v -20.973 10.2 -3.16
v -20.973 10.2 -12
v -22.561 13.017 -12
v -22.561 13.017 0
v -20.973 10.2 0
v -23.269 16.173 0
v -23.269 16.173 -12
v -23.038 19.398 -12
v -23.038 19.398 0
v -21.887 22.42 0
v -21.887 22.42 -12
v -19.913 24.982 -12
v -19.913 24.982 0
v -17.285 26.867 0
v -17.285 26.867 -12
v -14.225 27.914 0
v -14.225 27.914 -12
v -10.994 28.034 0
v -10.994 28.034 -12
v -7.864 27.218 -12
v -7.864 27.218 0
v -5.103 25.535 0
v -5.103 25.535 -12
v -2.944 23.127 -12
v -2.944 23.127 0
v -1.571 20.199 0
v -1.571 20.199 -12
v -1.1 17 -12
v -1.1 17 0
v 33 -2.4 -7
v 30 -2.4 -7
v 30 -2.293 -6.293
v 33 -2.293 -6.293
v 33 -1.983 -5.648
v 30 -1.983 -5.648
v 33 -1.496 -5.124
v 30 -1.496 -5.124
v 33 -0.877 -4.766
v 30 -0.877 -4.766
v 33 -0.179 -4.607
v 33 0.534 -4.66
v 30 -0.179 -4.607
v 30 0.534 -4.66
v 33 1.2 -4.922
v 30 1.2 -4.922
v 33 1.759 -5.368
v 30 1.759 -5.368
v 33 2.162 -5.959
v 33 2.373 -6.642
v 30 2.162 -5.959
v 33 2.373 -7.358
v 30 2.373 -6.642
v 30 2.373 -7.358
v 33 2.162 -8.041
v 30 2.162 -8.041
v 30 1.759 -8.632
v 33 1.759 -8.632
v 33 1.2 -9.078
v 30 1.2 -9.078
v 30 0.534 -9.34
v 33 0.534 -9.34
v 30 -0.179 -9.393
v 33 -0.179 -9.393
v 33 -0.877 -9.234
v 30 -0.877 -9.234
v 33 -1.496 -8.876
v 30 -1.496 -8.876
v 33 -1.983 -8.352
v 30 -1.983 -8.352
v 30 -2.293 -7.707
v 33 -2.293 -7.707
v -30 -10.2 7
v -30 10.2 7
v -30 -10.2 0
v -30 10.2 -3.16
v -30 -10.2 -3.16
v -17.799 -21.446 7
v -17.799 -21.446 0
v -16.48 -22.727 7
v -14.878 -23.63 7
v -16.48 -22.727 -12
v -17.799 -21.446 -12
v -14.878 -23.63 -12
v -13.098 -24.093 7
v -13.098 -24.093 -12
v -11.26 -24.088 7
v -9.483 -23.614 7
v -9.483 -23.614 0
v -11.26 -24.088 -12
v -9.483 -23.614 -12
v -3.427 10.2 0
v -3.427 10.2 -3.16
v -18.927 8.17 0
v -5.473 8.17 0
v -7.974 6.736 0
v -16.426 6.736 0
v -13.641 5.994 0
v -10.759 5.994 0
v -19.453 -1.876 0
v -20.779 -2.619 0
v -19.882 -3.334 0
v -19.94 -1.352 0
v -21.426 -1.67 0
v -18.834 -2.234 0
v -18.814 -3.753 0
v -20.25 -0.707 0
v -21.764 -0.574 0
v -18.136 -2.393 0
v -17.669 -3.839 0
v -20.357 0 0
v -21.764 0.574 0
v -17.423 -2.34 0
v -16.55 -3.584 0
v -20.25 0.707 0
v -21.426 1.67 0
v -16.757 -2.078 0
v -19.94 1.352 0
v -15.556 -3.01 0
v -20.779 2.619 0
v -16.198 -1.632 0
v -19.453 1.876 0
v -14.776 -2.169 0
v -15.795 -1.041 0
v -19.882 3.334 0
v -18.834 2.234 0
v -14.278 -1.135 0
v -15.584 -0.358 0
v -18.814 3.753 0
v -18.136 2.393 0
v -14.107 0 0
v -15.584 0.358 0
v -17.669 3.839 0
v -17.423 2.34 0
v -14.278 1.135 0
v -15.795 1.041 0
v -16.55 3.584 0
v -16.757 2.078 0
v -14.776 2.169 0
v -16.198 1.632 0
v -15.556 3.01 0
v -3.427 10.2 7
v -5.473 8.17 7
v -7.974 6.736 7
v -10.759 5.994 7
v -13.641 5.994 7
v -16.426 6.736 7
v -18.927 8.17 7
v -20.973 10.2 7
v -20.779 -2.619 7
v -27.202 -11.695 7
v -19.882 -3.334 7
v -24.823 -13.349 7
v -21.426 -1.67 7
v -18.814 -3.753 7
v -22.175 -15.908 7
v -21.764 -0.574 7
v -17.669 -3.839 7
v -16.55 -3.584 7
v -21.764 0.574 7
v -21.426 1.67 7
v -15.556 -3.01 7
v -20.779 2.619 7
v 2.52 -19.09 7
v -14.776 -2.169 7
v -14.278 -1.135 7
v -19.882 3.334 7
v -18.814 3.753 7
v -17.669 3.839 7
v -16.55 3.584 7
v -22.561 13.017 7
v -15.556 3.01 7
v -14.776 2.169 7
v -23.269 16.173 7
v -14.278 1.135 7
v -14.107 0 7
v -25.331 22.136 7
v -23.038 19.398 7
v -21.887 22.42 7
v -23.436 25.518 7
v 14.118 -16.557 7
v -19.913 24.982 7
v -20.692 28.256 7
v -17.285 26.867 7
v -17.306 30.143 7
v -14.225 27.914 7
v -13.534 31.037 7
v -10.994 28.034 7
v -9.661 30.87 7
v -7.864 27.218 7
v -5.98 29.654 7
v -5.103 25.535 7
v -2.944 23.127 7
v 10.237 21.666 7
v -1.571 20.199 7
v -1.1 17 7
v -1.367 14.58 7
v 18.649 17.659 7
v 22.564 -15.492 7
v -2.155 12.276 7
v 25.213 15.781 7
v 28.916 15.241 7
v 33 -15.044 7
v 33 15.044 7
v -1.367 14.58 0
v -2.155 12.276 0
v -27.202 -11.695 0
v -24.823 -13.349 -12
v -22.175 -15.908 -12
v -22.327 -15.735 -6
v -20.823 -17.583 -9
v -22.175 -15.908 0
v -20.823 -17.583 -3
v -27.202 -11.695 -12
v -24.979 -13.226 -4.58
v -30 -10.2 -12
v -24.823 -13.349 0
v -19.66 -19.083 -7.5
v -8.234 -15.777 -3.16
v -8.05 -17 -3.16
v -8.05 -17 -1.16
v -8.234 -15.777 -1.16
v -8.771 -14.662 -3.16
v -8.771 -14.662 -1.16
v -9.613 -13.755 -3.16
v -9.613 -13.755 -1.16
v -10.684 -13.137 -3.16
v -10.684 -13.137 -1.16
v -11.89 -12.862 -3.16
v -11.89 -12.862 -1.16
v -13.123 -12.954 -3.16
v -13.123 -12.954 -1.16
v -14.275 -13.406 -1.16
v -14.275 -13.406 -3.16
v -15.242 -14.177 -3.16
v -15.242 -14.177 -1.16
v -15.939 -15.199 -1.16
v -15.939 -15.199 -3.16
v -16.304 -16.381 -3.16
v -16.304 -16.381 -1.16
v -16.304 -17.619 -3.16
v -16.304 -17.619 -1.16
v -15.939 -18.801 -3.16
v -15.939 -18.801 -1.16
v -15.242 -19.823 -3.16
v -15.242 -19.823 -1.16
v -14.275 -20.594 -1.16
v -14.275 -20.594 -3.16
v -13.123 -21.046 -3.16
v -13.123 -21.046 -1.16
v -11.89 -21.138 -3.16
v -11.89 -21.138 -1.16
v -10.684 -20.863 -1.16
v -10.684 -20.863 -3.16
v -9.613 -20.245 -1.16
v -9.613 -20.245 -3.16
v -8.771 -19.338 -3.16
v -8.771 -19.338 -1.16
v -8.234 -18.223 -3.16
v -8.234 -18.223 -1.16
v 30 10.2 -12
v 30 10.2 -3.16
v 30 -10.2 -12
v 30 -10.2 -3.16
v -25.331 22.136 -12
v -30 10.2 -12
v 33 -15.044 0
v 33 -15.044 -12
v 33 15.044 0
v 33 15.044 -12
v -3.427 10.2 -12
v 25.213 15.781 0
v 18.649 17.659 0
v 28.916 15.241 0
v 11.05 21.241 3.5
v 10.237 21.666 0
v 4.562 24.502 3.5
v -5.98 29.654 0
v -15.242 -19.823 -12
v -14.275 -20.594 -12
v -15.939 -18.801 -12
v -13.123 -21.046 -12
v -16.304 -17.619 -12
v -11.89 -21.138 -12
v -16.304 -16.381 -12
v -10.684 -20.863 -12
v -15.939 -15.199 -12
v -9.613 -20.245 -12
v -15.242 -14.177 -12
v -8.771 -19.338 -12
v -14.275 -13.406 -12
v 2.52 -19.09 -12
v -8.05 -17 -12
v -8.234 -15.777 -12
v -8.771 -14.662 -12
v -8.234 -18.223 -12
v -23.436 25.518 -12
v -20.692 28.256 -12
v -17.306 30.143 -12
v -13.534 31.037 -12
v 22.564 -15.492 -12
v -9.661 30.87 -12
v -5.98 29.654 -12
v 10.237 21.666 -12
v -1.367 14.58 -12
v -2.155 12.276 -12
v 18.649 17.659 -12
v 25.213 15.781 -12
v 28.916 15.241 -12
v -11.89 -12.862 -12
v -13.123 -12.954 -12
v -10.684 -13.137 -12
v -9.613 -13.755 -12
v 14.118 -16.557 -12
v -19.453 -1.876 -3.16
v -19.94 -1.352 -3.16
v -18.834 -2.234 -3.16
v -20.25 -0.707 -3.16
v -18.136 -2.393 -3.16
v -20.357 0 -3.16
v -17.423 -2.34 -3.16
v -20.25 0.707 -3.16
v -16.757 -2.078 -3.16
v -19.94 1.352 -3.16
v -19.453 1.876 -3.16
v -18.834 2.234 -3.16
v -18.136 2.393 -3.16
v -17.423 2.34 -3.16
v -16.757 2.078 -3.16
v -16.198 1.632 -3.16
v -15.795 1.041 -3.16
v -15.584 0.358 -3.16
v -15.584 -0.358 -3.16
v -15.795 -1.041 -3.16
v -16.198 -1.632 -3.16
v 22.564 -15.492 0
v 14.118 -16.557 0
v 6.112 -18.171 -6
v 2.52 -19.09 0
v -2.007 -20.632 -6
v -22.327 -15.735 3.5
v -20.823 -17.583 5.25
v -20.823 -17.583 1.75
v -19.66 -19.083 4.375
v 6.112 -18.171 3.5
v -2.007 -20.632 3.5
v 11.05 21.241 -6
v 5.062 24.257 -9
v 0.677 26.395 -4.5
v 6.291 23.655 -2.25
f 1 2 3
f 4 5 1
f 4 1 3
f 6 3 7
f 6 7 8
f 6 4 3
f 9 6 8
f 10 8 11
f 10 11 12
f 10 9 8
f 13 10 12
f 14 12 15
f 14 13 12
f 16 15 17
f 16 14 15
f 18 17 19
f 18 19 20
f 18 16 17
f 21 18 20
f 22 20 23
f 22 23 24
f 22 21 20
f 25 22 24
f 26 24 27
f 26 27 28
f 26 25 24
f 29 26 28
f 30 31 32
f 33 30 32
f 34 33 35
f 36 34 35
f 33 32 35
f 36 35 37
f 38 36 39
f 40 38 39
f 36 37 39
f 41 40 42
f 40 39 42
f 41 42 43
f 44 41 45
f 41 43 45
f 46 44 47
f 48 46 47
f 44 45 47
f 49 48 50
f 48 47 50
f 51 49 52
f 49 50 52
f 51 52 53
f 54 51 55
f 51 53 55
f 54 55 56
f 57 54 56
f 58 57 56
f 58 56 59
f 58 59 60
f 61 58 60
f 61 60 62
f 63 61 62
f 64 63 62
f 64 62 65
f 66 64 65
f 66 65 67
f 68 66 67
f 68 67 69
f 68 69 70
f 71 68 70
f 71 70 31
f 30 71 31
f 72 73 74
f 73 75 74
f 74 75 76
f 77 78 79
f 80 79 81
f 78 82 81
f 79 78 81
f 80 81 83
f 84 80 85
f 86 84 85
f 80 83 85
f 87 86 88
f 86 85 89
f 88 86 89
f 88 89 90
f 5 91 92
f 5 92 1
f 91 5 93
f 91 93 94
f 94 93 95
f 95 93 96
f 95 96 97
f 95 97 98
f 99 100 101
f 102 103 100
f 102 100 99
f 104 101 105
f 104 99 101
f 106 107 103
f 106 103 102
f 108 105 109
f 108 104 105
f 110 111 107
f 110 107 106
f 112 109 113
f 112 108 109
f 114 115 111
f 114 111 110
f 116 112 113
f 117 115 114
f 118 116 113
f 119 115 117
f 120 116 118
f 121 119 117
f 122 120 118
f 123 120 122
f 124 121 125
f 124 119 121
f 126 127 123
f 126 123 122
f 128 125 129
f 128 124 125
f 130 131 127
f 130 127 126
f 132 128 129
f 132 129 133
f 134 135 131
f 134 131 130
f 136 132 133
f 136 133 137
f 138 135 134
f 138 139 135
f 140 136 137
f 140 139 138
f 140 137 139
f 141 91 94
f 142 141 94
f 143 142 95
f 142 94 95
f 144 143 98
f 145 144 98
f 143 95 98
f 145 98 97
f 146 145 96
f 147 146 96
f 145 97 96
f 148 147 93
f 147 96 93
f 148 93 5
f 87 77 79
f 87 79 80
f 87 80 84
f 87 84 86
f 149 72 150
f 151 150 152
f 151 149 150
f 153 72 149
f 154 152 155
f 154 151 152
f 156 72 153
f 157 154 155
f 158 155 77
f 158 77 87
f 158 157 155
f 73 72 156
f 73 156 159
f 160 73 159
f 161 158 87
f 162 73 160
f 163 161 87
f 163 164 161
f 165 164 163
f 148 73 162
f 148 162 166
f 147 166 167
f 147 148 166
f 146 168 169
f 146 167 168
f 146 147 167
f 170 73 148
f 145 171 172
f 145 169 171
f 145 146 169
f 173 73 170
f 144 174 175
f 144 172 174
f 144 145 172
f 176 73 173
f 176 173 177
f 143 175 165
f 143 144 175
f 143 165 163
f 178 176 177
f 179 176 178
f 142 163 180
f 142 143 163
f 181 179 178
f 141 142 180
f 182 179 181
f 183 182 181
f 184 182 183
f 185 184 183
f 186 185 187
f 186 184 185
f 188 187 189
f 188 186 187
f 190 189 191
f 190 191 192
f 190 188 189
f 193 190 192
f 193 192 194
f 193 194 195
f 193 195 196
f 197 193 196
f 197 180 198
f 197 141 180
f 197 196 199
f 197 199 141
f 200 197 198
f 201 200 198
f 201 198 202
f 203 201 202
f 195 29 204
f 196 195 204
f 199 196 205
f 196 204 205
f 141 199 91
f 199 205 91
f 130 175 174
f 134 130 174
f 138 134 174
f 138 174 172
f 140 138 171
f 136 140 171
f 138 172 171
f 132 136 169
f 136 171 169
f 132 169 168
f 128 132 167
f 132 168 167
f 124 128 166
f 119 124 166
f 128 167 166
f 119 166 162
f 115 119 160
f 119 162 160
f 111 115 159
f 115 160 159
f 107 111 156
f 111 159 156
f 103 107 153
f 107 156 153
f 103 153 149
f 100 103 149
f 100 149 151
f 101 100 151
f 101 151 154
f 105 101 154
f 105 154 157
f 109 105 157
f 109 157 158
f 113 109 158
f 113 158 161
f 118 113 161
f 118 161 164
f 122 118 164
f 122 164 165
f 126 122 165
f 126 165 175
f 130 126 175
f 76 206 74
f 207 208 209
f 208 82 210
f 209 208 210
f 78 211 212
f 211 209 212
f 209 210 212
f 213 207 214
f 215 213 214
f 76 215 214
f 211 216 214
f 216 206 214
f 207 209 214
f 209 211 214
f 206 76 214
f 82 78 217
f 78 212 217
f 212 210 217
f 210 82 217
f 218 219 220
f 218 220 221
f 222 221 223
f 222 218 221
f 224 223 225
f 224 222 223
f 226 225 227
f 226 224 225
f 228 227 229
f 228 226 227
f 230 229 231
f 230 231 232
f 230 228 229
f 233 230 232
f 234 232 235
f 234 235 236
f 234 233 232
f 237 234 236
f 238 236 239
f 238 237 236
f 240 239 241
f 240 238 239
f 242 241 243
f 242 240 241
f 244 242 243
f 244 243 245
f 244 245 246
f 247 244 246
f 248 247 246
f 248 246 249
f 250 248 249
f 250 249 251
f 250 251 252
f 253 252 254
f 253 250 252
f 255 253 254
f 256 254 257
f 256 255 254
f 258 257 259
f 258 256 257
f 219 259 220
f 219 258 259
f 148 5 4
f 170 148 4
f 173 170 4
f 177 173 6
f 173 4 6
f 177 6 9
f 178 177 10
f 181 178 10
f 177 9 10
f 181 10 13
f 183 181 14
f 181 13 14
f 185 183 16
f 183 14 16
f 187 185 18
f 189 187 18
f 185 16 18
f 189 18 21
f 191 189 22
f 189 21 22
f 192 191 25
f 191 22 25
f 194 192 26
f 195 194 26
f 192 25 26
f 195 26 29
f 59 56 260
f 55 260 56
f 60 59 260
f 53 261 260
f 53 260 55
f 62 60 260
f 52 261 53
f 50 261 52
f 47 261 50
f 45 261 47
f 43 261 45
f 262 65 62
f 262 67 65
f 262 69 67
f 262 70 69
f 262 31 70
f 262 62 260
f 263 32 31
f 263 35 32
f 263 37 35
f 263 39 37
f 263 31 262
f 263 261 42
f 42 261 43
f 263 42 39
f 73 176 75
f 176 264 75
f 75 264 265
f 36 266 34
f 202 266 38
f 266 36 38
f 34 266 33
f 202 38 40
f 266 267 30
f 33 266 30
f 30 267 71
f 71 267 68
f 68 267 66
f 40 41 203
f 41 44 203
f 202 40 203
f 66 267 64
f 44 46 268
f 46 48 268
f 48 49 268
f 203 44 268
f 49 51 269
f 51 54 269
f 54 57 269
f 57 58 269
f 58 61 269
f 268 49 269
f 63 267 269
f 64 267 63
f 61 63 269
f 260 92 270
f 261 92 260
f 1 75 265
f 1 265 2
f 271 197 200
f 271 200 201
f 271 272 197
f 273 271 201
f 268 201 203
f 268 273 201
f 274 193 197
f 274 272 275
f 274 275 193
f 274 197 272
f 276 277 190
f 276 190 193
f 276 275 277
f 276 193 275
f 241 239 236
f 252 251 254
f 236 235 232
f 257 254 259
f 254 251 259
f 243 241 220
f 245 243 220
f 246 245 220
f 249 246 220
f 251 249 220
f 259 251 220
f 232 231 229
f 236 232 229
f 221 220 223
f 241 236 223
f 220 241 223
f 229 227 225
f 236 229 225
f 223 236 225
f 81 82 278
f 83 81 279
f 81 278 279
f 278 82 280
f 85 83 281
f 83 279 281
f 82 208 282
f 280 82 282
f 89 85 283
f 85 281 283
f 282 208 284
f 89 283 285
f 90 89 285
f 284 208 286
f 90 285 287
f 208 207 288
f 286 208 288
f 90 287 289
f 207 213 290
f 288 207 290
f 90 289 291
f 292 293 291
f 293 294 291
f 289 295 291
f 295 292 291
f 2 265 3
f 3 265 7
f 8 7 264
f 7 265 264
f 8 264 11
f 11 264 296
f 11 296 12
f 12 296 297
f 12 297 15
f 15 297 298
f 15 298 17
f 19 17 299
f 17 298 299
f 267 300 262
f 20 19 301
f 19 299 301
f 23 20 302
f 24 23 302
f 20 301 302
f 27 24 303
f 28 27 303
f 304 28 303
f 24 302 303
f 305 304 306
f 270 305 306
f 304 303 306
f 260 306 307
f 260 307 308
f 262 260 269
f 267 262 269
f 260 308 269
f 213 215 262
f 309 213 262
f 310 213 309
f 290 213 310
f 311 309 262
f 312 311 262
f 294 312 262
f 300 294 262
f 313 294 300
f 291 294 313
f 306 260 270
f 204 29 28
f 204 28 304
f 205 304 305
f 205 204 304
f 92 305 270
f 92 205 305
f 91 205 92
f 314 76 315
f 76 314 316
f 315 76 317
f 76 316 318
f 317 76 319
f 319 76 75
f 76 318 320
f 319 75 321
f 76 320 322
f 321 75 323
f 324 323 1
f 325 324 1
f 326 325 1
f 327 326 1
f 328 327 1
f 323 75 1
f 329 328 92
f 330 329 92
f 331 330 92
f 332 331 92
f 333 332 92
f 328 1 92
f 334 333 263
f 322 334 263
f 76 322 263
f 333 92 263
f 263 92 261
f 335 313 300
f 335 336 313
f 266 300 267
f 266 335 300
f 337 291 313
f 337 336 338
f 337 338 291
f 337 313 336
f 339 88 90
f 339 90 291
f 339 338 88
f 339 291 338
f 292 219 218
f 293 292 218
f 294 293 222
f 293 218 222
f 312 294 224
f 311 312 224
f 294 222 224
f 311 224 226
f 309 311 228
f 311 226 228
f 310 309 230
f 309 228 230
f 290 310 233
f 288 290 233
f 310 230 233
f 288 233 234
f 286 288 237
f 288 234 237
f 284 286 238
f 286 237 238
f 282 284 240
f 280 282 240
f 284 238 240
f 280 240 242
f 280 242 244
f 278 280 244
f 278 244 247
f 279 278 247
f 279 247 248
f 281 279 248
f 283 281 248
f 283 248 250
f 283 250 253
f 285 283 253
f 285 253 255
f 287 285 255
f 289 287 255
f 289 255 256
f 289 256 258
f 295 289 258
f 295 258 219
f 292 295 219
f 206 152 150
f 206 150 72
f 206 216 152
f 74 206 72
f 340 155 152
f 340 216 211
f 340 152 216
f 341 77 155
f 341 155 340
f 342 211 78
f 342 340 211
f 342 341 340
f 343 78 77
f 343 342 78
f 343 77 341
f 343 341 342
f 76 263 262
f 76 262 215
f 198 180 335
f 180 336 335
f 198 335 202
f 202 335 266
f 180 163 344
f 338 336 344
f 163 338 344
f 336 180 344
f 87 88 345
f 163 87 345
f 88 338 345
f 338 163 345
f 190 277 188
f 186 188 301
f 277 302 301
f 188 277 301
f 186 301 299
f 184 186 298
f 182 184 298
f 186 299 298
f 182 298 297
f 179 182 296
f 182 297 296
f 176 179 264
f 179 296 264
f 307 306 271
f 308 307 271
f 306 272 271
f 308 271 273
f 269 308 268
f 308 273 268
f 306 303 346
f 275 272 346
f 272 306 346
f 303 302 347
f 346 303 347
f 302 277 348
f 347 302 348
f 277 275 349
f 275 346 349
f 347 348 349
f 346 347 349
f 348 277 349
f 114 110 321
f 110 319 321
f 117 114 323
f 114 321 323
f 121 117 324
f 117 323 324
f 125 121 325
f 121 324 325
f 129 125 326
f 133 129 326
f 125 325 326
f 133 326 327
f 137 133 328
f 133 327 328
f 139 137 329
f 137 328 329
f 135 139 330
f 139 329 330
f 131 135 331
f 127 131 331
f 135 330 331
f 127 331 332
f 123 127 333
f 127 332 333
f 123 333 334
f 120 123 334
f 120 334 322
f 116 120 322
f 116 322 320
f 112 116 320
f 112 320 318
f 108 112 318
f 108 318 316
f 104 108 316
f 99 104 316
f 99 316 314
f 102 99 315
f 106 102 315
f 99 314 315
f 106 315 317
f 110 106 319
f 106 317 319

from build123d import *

# Parameters (mm, degrees)
F0_R           = 4.15
F1_DEPTH       = 12
F2_DEPTH       = 3.16
F3_DEPTH       = 7
F6_D           = 4.8
F6_DEPTH       = 15
F6_CBORE_D     = 7.7
F6_CBORE_DEPTH = 7
F6_TIP         = 1.4420654857
F7_D           = 4.8
F7_DEPTH       = 10
F7_TIP         = 1.4420654857
F8_DEPTH       = 2


# Not quite as in the source:
# - after a boolean that leaves OpenCascade's solid faulty, fix() repairs it


with BuildPart() as f1:
    # F0 (on Top) → F1 (new body)
    with BuildSketch(Plane.XY):
        with BuildLine():
            Line((30, 10.2), (30, -10.2))
            Line((30, -10.2), (-30, -10.2))
            add(Edge.make_bspline(
                [(-17.7992275989, -21.4464761661), (-20.8859294653, -17.5595451146), (-21.6980138001, -16.2221621605), (-25.6317793117, -12.2553748449), (-30, -10.2)],
                knots=[0, 0, 0, 0, 0.4674468376, 1, 1, 1, 1], degree=3))
            ThreePointArc((-17.7992275989, -21.4464761661), (-14.003054565, -23.9189229101), (-9.4830172376, -23.6136604591))
            add(Edge.make_bspline(
                [(-9.4830172376, -23.6136604591), (0, -19.7179064316), (4.4370511503, -18.4021307002), (20.4163611322, -15.0439910263), (33, -15.0439910263)],
                knots=[0, 0, 0, 0, 0.4385632438, 1, 1, 1, 1], degree=3))
            Line((33, -15.0439910263), (33, 15.0439910263))
            add(Edge.make_bspline(
                [(-5.9802875731, 29.6540577416), (4.8586864574, 24.3264938357), (9.2455528778, 22.3735984932), (22.4546817712, 15.0439910263), (33, 15.0439910263)],
                knots=[0.0105896754, 0.0105896754, 0.0105896754, 0.0105896754, 0.4824749826, 1, 1, 1, 1], degree=3))
            ThreePointArc((-5.9802875731, 29.6540577416), (-0.2311248394, 24.4535915766), (1.9, 17))
            ThreePointArc((1.9, 17), (1.4559897714, 13.4894525551), (0.1519229272, 10.2))
            Line((0.1519229272, 10.2), (30, 10.2))
        make_face()
        with Locations((-12.2, -17)):
            Circle(F0_R, mode=Mode.SUBTRACT)
        with BuildLine():
            Line((-3.4267451878, 10.2), (0.1519229272, 10.2))
            ThreePointArc((0.1519229272, 10.2), (1.4559897714, 13.4894525551), (1.9, 17))
            ThreePointArc((1.9, 17), (-0.2311248394, 24.4535915766), (-5.9802875731, 29.6540577416))
            ThreePointArc((-5.9802875731, 29.6540577416), (-17.3060634553, 30.1429873313), (-25.3312422306, 22.1361928977))
            ThreePointArc((-25.3312422306, 22.1361928977), (-26.2700427092, 16.0813607005), (-24.5519229272, 10.2))
            Line((-24.5519229272, 10.2), (-20.9732548122, 10.2))
            ThreePointArc((-20.9732548122, 10.2), (-15.7935269294, 27.5022171092), (-1.1, 17))
            ThreePointArc((-1.1, 17), (-1.6977828908, 13.4064730706), (-3.4267451878, 10.2))
        make_face()
        with BuildLine():
            Line((-25.3312422306, 22.1361928977), (-30, 10.2))
            Line((-30, 10.2), (-24.5519229272, 10.2))
            ThreePointArc((-24.5519229272, 10.2), (-26.2700427092, 16.0813607005), (-25.3312422306, 22.1361928977))
        make_face()
    extrude(amount=-F1_DEPTH)

    # F0 (on Top) → F2 (join)
    with BuildSketch(Plane.XY):
        with BuildLine():
            Line((-30, -10.2), (30, -10.2))
            Line((30, -10.2), (30, 10.2))
            Line((30, 10.2), (0.1519229272, 10.2))
            ThreePointArc((0.1519229272, 10.2), (-12.2, 2.9), (-24.5519229272, 10.2))
            Line((-24.5519229272, 10.2), (-30, 10.2))
            Line((-30, 10.2), (-30, -10.2))
        make_face()
        with BuildLine():
            ThreePointArc((-24.5519229272, 10.2), (-12.2, 2.9), (0.1519229272, 10.2))
            Line((0.1519229272, 10.2), (-3.4267451878, 10.2))
            ThreePointArc((-3.4267451878, 10.2), (-12.2, 5.9), (-20.9732548122, 10.2))
            Line((-20.9732548122, 10.2), (-24.5519229272, 10.2))
        make_face()
        with BuildLine():
            ThreePointArc((-20.9732548122, 10.2), (-12.2, 5.9), (-3.4267451878, 10.2))
            Line((-3.4267451878, 10.2), (-20.9732548122, 10.2))
        make_face()
        with Locations((-12.2, -17)):
            Circle(F0_R)
    extrude(amount=-F2_DEPTH)

    # F0 (on Top) → F3 (join)
    with BuildSketch(Plane.XY):
        with BuildLine():
            Line((-3.4267451878, 10.2), (0.1519229272, 10.2))
            ThreePointArc((0.1519229272, 10.2), (1.4559897714, 13.4894525551), (1.9, 17))
            ThreePointArc((1.9, 17), (-0.2311248394, 24.4535915766), (-5.9802875731, 29.6540577416))
            ThreePointArc((-5.9802875731, 29.6540577416), (-17.3060634553, 30.1429873313), (-25.3312422306, 22.1361928977))
            ThreePointArc((-25.3312422306, 22.1361928977), (-26.2700427092, 16.0813607005), (-24.5519229272, 10.2))
            Line((-24.5519229272, 10.2), (-20.9732548122, 10.2))
            ThreePointArc((-20.9732548122, 10.2), (-15.7935269294, 27.5022171092), (-1.1, 17))
            ThreePointArc((-1.1, 17), (-1.6977828908, 13.4064730706), (-3.4267451878, 10.2))
        make_face()
        with BuildLine():
            ThreePointArc((-24.5519229272, 10.2), (-12.2, 2.9), (0.1519229272, 10.2))
            Line((0.1519229272, 10.2), (-3.4267451878, 10.2))
            ThreePointArc((-3.4267451878, 10.2), (-12.2, 5.9), (-20.9732548122, 10.2))
            Line((-20.9732548122, 10.2), (-24.5519229272, 10.2))
        make_face()
        with BuildLine():
            Line((30, 10.2), (30, -10.2))
            Line((30, -10.2), (-30, -10.2))
            add(Edge.make_bspline(
                [(-17.7992275989, -21.4464761661), (-20.8859294653, -17.5595451146), (-21.6980138001, -16.2221621605), (-25.6317793117, -12.2553748449), (-30, -10.2)],
                knots=[0, 0, 0, 0, 0.4674468376, 1, 1, 1, 1], degree=3))
            ThreePointArc((-17.7992275989, -21.4464761661), (-14.003054565, -23.9189229101), (-9.4830172376, -23.6136604591))
            add(Edge.make_bspline(
                [(-9.4830172376, -23.6136604591), (0, -19.7179064316), (4.4370511503, -18.4021307002), (20.4163611322, -15.0439910263), (33, -15.0439910263)],
                knots=[0, 0, 0, 0, 0.4385632438, 1, 1, 1, 1], degree=3))
            Line((33, -15.0439910263), (33, 15.0439910263))
            add(Edge.make_bspline(
                [(-5.9802875731, 29.6540577416), (4.8586864574, 24.3264938357), (9.2455528778, 22.3735984932), (22.4546817712, 15.0439910263), (33, 15.0439910263)],
                knots=[0.0105896754, 0.0105896754, 0.0105896754, 0.0105896754, 0.4824749826, 1, 1, 1, 1], degree=3))
            ThreePointArc((-5.9802875731, 29.6540577416), (-0.2311248394, 24.4535915766), (1.9, 17))
            ThreePointArc((1.9, 17), (1.4559897714, 13.4894525551), (0.1519229272, 10.2))
            Line((0.1519229272, 10.2), (30, 10.2))
        make_face()
        with Locations((-12.2, -17)):
            Circle(F0_R, mode=Mode.SUBTRACT)
        with BuildLine():
            Line((-30, -10.2), (30, -10.2))
            Line((30, -10.2), (30, 10.2))
            Line((30, 10.2), (0.1519229272, 10.2))
            ThreePointArc((0.1519229272, 10.2), (-12.2, 2.9), (-24.5519229272, 10.2))
            Line((-24.5519229272, 10.2), (-30, 10.2))
            Line((-30, 10.2), (-30, -10.2))
        make_face()
        with BuildLine():
            Line((-25.3312422306, 22.1361928977), (-30, 10.2))
            Line((-30, 10.2), (-24.5519229272, 10.2))
            ThreePointArc((-24.5519229272, 10.2), (-26.2700427092, 16.0813607005), (-25.3312422306, 22.1361928977))
        make_face()
        with Locations((-12.2, -17)):
            Circle(F0_R)
    extrude(amount=F3_DEPTH)

    # F6
    with Locations(Plane.XY.offset(7)):
        with Locations((-17.9568603635, 0)):
            CounterBoreHole(F6_D / 2, F6_CBORE_D / 2, F6_CBORE_DEPTH, depth=F6_DEPTH)
            with Locations((0, 0, -(F6_DEPTH + F6_TIP / 2))):  # 118° drill point
                Cone(0, F6_D / 2, F6_TIP, mode=Mode.SUBTRACT)

    # F7
    with Locations(Plane.YZ.offset(33)):
        with Locations((0, -7)):
            Hole(F7_D / 2, depth=F7_DEPTH)
            with Locations((0, 0, -(F7_DEPTH + F7_TIP / 2))):  # 118° drill point
                Cone(0, F7_D / 2, F7_TIP, mode=Mode.SUBTRACT)

    add(f1.part.fix(), mode=Mode.REPLACE)

    # F8 (cut): a face of the model
    f8_faces = [f1.faces().sort_by_distance(p)[0] for p in [
        (-12.2, -17, -3.16),
    ]]
    extrude(f8_faces, amount=-F8_DEPTH, mode=Mode.SUBTRACT)


solid = f1.part
